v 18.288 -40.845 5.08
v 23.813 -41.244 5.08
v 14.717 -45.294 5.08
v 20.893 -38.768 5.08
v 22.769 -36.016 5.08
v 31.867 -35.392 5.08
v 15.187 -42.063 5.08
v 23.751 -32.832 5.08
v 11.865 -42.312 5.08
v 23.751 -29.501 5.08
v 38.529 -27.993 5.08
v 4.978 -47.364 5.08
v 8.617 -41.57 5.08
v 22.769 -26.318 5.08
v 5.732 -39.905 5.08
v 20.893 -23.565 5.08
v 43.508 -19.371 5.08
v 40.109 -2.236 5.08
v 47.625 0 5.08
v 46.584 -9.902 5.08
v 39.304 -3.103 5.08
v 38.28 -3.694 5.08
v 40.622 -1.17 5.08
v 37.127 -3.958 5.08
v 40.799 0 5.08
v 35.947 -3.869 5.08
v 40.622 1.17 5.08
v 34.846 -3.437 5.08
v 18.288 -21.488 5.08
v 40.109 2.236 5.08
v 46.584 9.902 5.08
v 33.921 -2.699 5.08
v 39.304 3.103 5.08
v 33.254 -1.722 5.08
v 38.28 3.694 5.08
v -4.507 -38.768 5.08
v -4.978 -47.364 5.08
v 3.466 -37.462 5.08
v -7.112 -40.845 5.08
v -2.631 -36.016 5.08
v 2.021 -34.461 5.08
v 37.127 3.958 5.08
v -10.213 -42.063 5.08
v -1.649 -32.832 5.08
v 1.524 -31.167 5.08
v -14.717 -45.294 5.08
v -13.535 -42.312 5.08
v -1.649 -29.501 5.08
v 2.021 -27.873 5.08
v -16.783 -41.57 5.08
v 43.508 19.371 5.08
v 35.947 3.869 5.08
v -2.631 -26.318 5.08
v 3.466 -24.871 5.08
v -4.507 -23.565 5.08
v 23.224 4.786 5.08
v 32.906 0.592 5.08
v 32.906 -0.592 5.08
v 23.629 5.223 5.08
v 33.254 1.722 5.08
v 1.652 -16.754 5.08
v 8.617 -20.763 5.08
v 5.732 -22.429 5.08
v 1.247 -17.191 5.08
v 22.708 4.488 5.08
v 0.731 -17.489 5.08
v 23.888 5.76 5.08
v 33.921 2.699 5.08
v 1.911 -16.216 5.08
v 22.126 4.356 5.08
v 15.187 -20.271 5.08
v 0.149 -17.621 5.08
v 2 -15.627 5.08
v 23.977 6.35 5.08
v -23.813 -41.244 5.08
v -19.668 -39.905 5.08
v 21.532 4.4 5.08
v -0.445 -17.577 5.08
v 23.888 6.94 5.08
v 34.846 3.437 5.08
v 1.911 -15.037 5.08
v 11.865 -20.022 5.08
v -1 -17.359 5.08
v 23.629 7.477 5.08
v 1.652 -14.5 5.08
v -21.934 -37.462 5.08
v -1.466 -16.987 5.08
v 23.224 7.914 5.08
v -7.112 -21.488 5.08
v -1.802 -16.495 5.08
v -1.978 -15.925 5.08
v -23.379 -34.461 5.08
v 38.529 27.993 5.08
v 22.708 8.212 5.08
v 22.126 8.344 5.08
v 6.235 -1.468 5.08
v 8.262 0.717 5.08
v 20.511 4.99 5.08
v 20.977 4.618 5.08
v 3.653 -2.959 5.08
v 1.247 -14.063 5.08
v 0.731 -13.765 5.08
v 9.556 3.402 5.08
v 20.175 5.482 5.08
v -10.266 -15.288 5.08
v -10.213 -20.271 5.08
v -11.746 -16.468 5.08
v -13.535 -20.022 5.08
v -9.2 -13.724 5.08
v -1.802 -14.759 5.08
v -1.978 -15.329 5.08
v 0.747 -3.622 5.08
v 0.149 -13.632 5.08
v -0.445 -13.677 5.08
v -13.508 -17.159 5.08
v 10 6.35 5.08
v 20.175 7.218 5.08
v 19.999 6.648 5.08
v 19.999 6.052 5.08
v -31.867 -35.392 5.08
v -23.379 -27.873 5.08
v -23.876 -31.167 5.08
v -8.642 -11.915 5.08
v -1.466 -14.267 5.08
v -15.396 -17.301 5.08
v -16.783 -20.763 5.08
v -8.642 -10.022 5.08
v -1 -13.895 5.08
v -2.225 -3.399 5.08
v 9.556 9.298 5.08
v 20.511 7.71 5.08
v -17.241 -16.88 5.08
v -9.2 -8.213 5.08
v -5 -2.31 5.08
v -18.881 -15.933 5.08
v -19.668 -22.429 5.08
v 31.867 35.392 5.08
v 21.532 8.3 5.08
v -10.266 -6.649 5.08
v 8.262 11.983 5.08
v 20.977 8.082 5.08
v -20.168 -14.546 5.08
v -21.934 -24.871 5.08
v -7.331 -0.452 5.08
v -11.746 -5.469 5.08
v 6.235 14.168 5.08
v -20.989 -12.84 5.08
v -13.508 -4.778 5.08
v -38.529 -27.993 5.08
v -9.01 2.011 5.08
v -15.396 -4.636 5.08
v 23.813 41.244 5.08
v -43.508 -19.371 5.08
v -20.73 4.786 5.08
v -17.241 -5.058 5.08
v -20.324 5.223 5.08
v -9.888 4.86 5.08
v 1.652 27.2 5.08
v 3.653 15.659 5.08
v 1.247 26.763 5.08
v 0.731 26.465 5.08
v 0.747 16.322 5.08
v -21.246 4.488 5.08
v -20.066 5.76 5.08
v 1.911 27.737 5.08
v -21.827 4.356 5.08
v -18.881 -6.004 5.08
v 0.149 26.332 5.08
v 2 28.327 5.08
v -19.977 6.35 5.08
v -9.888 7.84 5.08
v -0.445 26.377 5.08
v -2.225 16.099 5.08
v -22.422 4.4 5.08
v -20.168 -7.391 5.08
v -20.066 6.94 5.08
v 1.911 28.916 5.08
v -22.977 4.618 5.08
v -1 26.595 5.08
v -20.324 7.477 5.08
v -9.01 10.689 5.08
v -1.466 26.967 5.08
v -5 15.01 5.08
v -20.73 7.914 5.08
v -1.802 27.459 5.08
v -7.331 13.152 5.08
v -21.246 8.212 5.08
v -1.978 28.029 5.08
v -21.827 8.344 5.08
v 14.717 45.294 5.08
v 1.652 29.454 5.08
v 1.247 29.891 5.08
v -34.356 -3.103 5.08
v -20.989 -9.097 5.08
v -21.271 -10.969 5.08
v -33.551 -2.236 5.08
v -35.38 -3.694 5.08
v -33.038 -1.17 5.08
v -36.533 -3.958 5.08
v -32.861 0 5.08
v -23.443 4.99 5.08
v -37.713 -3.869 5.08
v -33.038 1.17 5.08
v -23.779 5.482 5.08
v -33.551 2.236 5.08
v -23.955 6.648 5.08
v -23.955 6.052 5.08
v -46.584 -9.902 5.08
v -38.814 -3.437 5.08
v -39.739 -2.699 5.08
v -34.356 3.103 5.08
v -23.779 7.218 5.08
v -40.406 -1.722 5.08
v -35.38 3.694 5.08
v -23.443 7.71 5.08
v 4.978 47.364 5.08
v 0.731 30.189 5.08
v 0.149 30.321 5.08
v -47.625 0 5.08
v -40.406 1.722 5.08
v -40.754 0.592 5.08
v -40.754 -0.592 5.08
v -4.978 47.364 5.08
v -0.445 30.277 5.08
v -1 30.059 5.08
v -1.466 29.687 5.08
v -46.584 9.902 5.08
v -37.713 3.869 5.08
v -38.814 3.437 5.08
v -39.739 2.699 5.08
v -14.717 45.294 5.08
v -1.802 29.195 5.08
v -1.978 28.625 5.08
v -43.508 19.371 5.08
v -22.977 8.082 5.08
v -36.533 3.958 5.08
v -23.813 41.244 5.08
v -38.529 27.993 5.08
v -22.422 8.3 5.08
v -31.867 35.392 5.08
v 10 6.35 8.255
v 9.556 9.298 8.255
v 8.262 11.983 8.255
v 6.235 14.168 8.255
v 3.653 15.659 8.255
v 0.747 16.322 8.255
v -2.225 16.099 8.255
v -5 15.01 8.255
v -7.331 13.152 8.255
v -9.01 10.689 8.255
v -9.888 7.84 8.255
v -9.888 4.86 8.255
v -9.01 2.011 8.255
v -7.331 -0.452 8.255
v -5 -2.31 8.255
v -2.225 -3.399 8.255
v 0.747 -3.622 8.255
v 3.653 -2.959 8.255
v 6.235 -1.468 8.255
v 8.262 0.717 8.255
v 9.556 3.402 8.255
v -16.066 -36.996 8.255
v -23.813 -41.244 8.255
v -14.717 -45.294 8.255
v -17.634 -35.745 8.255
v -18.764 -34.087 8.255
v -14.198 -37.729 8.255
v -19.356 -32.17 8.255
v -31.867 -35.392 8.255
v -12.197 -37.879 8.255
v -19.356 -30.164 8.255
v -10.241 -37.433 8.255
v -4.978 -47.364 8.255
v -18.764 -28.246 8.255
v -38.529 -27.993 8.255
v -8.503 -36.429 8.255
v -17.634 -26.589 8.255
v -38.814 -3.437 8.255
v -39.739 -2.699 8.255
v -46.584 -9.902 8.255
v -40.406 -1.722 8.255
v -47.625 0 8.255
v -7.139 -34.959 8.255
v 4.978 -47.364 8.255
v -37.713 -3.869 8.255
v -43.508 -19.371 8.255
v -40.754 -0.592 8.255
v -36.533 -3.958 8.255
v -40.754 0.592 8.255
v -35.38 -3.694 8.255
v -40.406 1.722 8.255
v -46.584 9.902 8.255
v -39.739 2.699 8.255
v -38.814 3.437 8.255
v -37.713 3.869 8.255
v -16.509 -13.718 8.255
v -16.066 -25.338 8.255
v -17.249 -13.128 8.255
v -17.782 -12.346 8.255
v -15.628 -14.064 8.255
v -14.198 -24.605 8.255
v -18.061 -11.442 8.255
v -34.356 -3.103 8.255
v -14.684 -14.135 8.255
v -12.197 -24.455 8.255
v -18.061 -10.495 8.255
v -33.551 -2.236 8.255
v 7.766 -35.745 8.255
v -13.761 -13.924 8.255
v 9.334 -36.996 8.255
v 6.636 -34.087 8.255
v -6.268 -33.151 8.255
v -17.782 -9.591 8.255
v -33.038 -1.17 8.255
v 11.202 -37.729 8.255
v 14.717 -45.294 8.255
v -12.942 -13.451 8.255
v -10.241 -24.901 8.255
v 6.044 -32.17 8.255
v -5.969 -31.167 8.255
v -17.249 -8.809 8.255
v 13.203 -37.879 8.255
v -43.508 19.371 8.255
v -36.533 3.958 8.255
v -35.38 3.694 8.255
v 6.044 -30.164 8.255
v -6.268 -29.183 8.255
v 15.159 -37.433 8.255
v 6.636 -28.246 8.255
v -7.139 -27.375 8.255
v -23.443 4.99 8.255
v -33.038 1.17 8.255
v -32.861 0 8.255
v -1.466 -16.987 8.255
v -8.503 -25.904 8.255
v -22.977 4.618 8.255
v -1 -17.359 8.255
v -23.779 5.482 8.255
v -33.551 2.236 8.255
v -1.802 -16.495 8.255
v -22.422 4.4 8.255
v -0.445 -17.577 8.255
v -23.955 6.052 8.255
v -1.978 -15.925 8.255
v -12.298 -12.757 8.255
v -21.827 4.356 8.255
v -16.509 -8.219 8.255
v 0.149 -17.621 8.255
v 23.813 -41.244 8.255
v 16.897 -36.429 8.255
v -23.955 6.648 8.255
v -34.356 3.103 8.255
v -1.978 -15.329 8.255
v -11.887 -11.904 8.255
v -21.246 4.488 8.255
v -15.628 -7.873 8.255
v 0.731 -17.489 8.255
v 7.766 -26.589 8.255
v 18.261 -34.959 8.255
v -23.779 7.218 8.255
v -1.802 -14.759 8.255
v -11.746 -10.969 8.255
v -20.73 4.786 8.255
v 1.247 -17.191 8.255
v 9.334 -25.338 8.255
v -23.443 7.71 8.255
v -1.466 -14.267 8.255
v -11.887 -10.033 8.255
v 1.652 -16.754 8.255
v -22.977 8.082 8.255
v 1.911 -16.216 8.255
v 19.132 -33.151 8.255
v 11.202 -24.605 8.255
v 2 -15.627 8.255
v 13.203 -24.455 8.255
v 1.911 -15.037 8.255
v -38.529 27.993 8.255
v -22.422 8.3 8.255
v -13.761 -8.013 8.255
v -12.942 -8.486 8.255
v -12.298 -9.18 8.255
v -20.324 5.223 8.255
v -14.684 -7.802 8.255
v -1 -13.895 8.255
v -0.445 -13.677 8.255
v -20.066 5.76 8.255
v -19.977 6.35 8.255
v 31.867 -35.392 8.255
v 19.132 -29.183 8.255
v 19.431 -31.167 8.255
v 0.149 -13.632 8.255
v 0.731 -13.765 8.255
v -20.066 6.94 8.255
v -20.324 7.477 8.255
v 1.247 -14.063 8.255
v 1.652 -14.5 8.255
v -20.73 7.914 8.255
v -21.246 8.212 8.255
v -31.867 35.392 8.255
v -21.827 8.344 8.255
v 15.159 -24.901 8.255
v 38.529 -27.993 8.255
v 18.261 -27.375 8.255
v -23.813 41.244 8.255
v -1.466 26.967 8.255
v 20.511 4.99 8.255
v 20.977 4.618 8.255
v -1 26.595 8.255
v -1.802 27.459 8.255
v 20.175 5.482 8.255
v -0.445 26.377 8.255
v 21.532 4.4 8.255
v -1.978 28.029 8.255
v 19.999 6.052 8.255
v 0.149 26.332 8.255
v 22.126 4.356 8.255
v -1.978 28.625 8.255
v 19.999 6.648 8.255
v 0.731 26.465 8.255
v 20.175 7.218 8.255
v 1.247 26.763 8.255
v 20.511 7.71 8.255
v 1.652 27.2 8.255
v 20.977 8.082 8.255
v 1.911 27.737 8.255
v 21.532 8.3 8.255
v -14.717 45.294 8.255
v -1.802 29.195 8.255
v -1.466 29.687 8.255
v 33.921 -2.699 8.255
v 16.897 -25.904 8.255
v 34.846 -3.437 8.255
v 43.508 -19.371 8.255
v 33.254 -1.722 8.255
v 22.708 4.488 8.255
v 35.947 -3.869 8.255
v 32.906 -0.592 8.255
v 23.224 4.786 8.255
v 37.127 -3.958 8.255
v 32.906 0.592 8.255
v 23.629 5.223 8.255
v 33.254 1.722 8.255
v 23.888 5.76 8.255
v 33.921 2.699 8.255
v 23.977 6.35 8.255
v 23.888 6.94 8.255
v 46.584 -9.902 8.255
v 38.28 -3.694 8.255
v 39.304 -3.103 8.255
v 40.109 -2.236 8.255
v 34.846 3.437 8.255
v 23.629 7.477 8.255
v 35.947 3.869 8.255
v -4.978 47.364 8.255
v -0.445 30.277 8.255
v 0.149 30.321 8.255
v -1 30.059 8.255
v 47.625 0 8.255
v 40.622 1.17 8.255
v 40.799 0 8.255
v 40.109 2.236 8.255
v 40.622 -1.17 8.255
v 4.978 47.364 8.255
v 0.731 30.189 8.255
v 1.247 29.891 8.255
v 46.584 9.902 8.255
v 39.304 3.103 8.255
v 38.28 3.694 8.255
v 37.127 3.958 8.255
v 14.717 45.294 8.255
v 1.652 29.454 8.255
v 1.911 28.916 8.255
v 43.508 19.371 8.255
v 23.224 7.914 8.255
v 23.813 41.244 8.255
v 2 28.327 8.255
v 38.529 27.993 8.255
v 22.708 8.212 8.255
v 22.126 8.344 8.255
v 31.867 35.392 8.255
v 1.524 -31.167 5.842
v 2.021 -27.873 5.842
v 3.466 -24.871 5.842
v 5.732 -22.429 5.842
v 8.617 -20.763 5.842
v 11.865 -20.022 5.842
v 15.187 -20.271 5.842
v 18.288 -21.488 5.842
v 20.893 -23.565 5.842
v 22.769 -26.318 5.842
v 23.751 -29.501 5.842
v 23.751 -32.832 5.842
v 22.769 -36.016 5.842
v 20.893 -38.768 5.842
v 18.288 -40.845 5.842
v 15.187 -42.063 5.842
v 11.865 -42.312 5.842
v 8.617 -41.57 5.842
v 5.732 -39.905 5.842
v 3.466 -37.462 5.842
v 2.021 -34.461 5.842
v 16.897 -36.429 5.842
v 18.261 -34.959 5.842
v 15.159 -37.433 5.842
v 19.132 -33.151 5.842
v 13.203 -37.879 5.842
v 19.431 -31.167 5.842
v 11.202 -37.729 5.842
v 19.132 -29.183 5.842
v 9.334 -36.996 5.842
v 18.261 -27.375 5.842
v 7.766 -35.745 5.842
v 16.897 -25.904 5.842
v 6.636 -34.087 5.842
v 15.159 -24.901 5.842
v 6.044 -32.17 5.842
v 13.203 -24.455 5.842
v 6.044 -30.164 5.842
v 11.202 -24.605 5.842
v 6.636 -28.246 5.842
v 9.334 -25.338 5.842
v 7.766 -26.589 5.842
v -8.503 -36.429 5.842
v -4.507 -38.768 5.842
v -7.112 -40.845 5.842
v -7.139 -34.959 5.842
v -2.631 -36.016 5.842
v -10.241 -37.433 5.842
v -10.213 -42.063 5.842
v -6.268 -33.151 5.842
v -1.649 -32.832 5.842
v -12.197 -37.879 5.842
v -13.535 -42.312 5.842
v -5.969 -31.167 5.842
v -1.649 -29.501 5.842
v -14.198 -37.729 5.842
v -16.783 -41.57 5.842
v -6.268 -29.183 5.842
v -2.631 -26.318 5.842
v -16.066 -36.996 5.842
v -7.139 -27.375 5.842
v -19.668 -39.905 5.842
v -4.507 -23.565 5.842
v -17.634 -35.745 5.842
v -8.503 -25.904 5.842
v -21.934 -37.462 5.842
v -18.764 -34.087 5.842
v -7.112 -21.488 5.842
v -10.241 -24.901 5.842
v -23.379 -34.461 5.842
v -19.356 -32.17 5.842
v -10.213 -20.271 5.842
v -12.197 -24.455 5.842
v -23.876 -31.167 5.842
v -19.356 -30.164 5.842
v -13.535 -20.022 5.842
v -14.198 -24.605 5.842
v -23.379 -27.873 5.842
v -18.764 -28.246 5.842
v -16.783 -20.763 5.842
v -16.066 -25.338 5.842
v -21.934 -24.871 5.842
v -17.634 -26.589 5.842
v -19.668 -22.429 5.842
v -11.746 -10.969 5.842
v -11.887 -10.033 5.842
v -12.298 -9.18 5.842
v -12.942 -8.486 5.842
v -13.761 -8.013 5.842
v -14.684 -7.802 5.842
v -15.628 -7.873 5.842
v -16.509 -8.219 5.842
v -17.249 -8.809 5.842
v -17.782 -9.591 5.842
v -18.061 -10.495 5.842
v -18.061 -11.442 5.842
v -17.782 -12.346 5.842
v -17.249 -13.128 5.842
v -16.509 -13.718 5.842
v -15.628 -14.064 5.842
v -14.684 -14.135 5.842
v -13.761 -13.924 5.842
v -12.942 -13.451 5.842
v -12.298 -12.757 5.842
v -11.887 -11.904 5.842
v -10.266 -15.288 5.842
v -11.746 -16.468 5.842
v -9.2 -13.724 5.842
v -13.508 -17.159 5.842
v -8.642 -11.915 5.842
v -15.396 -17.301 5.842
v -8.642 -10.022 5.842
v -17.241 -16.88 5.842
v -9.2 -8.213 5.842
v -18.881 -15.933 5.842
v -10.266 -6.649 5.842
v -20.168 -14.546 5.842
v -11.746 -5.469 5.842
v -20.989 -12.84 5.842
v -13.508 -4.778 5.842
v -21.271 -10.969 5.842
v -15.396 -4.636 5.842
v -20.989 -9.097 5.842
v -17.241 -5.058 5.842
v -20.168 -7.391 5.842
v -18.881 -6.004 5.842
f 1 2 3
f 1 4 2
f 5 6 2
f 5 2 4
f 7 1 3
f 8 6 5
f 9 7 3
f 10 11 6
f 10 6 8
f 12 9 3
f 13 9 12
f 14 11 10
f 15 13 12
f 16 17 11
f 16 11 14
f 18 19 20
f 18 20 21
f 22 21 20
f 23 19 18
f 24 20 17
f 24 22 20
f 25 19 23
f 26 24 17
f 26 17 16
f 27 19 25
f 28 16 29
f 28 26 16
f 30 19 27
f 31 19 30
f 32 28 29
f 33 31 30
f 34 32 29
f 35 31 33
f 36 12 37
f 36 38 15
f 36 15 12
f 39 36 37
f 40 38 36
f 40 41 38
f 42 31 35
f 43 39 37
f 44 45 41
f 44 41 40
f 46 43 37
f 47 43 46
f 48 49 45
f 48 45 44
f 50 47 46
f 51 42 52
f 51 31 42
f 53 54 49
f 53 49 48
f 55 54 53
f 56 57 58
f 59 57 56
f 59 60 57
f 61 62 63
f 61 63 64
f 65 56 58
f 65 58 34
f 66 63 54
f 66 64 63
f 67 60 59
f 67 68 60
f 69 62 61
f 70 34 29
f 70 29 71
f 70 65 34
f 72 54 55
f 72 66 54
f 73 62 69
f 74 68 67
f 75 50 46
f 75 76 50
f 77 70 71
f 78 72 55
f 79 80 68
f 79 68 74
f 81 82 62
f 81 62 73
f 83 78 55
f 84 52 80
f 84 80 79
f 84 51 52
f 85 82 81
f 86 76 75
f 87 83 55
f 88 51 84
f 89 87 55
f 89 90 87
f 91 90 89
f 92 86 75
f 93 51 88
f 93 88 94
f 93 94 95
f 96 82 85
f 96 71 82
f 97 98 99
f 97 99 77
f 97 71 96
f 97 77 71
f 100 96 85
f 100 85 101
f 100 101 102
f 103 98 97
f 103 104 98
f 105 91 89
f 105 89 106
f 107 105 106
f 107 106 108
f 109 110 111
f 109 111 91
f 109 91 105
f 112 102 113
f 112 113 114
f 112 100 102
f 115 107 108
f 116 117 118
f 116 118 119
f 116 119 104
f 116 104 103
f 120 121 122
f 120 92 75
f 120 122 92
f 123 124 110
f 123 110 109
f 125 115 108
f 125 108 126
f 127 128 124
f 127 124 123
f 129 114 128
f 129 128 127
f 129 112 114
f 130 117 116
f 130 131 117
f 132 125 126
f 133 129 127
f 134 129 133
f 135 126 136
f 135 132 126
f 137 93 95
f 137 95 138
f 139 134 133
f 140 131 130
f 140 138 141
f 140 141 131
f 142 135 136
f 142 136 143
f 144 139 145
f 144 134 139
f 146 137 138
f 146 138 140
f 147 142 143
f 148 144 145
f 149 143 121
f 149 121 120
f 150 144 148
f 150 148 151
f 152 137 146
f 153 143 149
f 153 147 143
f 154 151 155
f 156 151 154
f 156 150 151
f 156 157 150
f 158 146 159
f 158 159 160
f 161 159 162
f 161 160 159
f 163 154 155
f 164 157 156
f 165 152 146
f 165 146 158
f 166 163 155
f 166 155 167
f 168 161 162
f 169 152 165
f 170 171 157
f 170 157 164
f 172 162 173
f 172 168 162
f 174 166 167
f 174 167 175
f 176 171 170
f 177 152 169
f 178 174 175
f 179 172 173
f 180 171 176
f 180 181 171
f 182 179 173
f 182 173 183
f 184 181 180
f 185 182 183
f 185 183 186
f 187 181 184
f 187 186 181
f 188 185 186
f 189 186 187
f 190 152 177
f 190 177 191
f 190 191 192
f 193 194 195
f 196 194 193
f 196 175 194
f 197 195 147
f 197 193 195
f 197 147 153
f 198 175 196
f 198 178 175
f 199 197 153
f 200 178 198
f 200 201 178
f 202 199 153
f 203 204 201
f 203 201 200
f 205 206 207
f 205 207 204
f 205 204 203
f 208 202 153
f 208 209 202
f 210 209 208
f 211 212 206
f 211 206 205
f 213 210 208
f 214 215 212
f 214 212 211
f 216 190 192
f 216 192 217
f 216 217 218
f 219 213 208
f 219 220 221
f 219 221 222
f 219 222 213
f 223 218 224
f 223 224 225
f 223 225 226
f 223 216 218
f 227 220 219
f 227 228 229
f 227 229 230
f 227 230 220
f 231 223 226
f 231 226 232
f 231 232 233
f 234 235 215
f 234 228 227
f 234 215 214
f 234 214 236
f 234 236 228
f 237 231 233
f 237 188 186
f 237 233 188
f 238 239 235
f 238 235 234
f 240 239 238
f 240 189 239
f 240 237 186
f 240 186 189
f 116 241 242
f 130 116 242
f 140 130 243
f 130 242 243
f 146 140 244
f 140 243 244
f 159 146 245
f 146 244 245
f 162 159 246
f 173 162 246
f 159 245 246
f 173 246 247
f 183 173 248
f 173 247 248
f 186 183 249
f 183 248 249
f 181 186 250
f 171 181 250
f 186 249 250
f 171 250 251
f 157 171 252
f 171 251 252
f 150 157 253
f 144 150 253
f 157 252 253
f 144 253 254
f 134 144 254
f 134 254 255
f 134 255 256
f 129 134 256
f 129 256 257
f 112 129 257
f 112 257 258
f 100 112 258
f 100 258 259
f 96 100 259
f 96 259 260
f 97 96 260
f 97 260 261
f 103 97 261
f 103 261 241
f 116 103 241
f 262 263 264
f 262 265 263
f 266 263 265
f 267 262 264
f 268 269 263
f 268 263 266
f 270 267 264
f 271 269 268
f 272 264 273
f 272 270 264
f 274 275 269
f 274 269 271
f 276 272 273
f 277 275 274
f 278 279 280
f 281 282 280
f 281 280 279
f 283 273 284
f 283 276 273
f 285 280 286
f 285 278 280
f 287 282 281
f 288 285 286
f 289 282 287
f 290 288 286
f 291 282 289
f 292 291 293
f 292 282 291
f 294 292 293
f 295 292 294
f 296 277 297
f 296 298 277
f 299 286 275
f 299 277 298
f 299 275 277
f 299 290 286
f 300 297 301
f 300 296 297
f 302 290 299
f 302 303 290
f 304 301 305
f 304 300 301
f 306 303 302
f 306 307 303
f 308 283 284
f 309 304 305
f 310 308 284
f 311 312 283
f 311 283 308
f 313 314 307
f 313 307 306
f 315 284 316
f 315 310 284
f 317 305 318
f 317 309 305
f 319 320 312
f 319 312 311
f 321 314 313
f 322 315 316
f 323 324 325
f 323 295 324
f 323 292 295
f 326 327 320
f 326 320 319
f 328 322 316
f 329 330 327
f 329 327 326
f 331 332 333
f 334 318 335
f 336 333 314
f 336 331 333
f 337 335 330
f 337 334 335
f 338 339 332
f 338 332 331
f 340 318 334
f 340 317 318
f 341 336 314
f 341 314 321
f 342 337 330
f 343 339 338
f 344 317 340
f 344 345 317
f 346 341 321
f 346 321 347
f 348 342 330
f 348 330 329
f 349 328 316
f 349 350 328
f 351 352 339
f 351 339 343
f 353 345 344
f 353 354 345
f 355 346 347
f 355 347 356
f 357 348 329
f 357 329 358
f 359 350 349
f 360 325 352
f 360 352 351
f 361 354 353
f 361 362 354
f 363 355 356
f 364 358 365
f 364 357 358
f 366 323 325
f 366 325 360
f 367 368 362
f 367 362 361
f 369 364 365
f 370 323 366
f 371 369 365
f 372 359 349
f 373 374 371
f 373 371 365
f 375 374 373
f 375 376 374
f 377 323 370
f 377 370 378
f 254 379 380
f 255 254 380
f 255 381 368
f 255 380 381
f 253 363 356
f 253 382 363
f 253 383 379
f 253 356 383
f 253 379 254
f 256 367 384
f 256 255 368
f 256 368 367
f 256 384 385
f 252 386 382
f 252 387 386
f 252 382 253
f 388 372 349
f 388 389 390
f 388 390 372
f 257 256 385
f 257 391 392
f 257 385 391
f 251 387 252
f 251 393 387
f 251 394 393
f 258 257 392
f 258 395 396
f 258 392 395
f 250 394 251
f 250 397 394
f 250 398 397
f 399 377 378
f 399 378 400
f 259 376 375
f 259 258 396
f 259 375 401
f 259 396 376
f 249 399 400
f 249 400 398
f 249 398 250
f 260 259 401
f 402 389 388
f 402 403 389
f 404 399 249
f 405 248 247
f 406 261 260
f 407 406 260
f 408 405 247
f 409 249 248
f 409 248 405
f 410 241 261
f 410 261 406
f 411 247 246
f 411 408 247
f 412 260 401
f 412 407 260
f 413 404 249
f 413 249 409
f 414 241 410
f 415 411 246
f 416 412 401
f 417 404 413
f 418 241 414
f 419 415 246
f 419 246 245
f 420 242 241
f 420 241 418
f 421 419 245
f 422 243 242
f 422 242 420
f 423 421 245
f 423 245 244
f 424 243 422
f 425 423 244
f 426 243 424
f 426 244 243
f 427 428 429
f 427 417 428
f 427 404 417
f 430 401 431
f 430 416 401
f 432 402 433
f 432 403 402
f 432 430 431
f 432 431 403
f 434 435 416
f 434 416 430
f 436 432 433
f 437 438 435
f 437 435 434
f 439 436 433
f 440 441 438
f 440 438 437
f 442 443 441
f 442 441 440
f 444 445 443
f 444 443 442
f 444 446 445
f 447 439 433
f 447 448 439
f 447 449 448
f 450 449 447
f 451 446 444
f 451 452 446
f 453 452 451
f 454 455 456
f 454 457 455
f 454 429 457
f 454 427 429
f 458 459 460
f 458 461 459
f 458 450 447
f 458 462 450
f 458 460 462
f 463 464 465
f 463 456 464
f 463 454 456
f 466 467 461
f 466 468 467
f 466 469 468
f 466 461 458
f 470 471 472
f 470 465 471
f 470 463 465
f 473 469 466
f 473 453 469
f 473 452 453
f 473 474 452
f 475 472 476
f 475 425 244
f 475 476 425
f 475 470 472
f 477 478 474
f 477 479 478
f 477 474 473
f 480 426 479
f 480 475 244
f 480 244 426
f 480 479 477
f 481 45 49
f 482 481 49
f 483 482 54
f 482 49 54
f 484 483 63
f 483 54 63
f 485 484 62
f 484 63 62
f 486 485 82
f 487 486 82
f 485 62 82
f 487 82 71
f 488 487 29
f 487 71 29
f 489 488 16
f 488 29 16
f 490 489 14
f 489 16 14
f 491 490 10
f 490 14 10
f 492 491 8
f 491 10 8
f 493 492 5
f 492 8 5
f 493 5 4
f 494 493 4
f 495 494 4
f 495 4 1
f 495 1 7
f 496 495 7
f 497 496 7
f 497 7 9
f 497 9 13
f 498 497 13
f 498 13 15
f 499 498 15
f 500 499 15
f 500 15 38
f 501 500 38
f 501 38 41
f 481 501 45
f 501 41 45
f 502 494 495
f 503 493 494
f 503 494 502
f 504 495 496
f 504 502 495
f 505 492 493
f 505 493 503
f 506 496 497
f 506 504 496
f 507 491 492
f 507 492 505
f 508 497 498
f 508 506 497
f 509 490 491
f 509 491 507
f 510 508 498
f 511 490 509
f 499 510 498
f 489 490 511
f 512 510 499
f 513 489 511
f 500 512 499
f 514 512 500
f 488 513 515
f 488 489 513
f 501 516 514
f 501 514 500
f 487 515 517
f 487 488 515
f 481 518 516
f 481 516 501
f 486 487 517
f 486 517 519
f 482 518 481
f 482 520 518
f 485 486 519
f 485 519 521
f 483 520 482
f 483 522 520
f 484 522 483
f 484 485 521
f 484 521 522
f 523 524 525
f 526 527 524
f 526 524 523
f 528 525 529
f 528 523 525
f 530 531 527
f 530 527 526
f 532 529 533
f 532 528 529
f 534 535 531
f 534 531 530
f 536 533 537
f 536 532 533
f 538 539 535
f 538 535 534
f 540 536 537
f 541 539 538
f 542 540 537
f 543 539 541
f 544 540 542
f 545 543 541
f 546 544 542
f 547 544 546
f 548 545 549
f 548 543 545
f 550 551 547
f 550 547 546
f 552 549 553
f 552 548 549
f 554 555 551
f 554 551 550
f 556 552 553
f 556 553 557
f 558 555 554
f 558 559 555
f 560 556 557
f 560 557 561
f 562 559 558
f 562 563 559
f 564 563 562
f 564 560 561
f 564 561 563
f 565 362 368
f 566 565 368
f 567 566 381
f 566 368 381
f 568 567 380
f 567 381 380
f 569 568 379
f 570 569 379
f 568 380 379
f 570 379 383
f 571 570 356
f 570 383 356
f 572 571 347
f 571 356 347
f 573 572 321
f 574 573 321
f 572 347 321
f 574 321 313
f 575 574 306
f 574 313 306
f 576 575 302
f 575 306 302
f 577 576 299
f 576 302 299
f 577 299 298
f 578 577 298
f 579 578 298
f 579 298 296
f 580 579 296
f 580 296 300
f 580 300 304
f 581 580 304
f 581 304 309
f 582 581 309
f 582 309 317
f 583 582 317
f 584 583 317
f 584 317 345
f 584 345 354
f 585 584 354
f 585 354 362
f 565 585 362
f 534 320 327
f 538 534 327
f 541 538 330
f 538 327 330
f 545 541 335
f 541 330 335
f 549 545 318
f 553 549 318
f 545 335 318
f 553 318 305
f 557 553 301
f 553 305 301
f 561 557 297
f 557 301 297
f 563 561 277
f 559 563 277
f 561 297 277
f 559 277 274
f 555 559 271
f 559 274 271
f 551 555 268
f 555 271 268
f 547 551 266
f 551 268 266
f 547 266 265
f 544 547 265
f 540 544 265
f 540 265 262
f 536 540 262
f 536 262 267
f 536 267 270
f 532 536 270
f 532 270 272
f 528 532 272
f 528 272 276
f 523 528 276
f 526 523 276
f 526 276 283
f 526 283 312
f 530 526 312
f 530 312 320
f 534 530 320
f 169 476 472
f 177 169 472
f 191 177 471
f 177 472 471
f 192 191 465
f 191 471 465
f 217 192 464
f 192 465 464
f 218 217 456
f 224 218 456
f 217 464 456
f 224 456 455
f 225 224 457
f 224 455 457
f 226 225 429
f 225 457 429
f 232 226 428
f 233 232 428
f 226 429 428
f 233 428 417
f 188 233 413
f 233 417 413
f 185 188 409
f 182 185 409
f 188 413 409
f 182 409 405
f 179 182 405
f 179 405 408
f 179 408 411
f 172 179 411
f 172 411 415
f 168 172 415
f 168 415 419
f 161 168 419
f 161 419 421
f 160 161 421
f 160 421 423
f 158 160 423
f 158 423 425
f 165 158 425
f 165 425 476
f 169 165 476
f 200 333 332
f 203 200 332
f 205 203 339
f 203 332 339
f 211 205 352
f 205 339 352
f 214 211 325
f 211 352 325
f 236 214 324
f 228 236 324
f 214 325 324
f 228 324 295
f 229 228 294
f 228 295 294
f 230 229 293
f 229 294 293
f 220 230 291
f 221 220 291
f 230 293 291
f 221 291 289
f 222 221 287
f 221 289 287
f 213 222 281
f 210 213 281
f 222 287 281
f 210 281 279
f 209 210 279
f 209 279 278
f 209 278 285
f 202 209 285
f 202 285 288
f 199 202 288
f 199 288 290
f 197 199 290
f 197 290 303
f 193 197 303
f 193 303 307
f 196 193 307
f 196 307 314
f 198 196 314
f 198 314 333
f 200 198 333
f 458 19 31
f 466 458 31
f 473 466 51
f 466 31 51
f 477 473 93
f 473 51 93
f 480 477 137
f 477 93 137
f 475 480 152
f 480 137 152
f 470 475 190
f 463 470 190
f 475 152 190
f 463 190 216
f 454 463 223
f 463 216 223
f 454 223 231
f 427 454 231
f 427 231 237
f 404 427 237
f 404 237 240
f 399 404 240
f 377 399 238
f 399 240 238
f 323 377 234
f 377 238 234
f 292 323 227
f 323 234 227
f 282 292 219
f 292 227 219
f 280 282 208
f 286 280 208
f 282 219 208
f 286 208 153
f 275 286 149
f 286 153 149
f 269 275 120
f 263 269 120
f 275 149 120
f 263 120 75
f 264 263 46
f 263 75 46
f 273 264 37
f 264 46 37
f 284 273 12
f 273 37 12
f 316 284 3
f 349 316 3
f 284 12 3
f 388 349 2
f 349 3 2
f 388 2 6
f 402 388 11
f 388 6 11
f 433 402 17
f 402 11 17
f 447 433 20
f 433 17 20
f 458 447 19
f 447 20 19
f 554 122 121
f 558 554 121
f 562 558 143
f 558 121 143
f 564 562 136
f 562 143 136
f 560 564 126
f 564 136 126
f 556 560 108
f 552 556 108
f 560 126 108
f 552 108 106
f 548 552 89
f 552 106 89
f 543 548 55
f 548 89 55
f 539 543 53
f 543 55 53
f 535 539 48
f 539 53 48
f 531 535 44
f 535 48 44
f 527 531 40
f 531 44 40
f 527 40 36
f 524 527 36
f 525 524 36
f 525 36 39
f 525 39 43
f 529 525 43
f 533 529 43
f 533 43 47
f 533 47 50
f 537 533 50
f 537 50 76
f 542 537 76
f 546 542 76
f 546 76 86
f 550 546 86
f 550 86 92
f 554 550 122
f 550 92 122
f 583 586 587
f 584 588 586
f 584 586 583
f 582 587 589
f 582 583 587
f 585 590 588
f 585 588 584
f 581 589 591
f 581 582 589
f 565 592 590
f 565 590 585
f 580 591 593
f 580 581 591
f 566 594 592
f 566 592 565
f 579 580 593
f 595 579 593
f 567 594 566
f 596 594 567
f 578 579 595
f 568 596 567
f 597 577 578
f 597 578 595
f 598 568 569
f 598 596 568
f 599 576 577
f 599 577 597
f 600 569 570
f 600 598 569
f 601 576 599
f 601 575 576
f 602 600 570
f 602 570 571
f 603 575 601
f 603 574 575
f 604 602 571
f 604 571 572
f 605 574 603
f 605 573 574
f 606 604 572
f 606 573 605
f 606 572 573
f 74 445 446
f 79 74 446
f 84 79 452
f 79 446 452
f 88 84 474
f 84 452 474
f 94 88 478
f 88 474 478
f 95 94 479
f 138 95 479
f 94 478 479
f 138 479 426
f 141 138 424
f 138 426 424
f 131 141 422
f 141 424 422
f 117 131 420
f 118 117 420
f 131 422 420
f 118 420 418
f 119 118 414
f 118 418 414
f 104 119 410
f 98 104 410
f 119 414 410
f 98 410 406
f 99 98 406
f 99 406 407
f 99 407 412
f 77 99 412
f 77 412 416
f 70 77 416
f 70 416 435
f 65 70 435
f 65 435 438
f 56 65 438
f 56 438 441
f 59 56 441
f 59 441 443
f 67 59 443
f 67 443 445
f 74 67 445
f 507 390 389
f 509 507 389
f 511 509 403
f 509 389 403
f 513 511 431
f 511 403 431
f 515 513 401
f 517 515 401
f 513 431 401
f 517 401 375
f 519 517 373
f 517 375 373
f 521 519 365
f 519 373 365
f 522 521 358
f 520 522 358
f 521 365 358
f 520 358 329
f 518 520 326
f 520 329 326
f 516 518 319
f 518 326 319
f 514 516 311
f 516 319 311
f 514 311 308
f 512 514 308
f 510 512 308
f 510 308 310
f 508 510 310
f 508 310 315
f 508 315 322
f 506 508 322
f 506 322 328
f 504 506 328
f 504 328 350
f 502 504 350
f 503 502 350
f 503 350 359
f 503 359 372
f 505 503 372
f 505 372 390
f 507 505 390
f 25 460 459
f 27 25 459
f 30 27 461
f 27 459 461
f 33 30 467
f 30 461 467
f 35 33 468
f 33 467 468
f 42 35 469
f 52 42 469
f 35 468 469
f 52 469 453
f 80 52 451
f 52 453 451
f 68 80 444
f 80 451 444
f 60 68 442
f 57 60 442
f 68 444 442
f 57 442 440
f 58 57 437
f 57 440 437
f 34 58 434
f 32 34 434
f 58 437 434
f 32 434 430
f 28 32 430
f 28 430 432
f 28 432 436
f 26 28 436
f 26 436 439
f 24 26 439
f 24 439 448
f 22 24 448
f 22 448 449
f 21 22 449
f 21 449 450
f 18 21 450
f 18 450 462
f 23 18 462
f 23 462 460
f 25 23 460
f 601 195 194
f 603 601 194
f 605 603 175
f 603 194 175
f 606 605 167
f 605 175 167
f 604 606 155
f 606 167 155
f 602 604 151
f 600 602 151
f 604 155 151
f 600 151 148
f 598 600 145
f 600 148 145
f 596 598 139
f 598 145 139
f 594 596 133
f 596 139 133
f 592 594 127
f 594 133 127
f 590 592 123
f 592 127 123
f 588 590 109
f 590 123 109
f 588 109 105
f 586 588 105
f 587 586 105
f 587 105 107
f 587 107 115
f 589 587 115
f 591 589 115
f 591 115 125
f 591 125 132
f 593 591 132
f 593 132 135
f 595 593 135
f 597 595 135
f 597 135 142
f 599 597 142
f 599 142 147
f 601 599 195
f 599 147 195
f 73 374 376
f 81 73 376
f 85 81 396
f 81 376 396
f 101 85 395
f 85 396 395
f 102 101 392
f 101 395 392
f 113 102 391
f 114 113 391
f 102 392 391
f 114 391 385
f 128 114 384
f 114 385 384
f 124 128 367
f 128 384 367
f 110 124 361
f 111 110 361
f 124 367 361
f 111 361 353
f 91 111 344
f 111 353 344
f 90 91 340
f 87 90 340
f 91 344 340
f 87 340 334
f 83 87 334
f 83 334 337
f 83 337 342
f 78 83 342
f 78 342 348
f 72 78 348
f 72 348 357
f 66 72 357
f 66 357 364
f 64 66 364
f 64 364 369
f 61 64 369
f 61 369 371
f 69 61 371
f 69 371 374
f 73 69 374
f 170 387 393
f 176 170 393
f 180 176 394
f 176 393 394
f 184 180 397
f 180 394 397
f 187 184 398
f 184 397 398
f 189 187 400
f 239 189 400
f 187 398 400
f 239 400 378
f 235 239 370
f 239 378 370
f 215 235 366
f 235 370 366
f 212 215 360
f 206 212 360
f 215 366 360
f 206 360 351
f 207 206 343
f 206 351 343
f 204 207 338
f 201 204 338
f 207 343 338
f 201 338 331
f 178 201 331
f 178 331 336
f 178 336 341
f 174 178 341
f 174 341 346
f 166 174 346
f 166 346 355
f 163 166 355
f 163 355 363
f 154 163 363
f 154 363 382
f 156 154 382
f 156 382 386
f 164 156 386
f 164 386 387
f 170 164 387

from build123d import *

# Parameters (mm, degrees)
SKETCH1_R           = 49.5046
BOSS_EXTRUDE1_DEPTH = 5.08
SKETCH2_R           = 47.625
BOSS_EXTRUDE2_DEPTH = 3.175
SKETCH3_R           = 6.731
SKETCH3_R_2         = 3.96875
SKETCH3_R_3         = 10
SKETCH3_R_4         = 2
SKETCH3_R_5         = 3.175
CUT_EXTRUDE1_DEPTH  = 9.255
SKETCH7_R           = 52.166274697
CUT_EXTRUDE4_DEPTH  = 5.08
SKETCH8_R           = 11.176
SKETCH8_R_2         = 6.35
CUT_EXTRUDE5_DEPTH  = 0.762


with BuildPart() as part:
    # Sketch1 → Boss-Extrude1 (new body)
    with BuildSketch(Plane.XY):
        Circle(SKETCH1_R)
    extrude(amount=BOSS_EXTRUDE1_DEPTH)

    # Sketch2 → Boss-Extrude2 (add)
    with BuildSketch(Plane.XY.offset(5.08)):
        Circle(SKETCH2_R)
    extrude(amount=BOSS_EXTRUDE2_DEPTH)

    # Sketch3 → Cut-Extrude1 (cut, through all)
    with BuildSketch(Plane.XY.offset(8.255)):
        with Locations((-12.7, -31.166793627)):
            Circle(SKETCH3_R)
        with Locations((12.7, -31.166793627)):
            Circle(SKETCH3_R)
        with Locations((-36.83, 0)):
            Circle(SKETCH3_R_2)
        with Locations((36.83, 0)):
            Circle(SKETCH3_R_2)
        with Locations((0, 6.35)):
            Circle(SKETCH3_R_3)
        with Locations((0, 28.326878759)):
            Circle(SKETCH3_R_4)
        with Locations((21.976878759, 6.35)):
            Circle(SKETCH3_R_4)
        with Locations((0, -15.626878759)):
            Circle(SKETCH3_R_4)
        with Locations((-21.976878759, 6.35)):
            Circle(SKETCH3_R_4)
        with Locations((-14.921345457, -10.968575281)):
            Circle(SKETCH3_R_5)
    extrude(amount=-CUT_EXTRUDE1_DEPTH, mode=Mode.SUBTRACT)

    # Sketch7 → Cut-Extrude4 (cut)
    with BuildSketch(Plane(origin=(0, 0, 0), x_dir=(-1, 0, 0), z_dir=(0, 0, -1))):
        Circle(SKETCH7_R)
    extrude(amount=-CUT_EXTRUDE4_DEPTH, mode=Mode.SUBTRACT)

    # Sketch8 → Cut-Extrude5 (cut)
    with BuildSketch(Plane(origin=(0, 0, 5.08), x_dir=(-1, 0, 0), z_dir=(0, 0, -1))):
        with Locations((-12.7, -31.166793627)):
            Circle(SKETCH8_R)
        with Locations((12.7, -31.166793627)):
            Circle(SKETCH8_R)
        with Locations((14.921345457, -10.968575281)):
            Circle(SKETCH8_R_2)
    extrude(amount=-CUT_EXTRUDE5_DEPTH, mode=Mode.SUBTRACT)


solid = part.part
